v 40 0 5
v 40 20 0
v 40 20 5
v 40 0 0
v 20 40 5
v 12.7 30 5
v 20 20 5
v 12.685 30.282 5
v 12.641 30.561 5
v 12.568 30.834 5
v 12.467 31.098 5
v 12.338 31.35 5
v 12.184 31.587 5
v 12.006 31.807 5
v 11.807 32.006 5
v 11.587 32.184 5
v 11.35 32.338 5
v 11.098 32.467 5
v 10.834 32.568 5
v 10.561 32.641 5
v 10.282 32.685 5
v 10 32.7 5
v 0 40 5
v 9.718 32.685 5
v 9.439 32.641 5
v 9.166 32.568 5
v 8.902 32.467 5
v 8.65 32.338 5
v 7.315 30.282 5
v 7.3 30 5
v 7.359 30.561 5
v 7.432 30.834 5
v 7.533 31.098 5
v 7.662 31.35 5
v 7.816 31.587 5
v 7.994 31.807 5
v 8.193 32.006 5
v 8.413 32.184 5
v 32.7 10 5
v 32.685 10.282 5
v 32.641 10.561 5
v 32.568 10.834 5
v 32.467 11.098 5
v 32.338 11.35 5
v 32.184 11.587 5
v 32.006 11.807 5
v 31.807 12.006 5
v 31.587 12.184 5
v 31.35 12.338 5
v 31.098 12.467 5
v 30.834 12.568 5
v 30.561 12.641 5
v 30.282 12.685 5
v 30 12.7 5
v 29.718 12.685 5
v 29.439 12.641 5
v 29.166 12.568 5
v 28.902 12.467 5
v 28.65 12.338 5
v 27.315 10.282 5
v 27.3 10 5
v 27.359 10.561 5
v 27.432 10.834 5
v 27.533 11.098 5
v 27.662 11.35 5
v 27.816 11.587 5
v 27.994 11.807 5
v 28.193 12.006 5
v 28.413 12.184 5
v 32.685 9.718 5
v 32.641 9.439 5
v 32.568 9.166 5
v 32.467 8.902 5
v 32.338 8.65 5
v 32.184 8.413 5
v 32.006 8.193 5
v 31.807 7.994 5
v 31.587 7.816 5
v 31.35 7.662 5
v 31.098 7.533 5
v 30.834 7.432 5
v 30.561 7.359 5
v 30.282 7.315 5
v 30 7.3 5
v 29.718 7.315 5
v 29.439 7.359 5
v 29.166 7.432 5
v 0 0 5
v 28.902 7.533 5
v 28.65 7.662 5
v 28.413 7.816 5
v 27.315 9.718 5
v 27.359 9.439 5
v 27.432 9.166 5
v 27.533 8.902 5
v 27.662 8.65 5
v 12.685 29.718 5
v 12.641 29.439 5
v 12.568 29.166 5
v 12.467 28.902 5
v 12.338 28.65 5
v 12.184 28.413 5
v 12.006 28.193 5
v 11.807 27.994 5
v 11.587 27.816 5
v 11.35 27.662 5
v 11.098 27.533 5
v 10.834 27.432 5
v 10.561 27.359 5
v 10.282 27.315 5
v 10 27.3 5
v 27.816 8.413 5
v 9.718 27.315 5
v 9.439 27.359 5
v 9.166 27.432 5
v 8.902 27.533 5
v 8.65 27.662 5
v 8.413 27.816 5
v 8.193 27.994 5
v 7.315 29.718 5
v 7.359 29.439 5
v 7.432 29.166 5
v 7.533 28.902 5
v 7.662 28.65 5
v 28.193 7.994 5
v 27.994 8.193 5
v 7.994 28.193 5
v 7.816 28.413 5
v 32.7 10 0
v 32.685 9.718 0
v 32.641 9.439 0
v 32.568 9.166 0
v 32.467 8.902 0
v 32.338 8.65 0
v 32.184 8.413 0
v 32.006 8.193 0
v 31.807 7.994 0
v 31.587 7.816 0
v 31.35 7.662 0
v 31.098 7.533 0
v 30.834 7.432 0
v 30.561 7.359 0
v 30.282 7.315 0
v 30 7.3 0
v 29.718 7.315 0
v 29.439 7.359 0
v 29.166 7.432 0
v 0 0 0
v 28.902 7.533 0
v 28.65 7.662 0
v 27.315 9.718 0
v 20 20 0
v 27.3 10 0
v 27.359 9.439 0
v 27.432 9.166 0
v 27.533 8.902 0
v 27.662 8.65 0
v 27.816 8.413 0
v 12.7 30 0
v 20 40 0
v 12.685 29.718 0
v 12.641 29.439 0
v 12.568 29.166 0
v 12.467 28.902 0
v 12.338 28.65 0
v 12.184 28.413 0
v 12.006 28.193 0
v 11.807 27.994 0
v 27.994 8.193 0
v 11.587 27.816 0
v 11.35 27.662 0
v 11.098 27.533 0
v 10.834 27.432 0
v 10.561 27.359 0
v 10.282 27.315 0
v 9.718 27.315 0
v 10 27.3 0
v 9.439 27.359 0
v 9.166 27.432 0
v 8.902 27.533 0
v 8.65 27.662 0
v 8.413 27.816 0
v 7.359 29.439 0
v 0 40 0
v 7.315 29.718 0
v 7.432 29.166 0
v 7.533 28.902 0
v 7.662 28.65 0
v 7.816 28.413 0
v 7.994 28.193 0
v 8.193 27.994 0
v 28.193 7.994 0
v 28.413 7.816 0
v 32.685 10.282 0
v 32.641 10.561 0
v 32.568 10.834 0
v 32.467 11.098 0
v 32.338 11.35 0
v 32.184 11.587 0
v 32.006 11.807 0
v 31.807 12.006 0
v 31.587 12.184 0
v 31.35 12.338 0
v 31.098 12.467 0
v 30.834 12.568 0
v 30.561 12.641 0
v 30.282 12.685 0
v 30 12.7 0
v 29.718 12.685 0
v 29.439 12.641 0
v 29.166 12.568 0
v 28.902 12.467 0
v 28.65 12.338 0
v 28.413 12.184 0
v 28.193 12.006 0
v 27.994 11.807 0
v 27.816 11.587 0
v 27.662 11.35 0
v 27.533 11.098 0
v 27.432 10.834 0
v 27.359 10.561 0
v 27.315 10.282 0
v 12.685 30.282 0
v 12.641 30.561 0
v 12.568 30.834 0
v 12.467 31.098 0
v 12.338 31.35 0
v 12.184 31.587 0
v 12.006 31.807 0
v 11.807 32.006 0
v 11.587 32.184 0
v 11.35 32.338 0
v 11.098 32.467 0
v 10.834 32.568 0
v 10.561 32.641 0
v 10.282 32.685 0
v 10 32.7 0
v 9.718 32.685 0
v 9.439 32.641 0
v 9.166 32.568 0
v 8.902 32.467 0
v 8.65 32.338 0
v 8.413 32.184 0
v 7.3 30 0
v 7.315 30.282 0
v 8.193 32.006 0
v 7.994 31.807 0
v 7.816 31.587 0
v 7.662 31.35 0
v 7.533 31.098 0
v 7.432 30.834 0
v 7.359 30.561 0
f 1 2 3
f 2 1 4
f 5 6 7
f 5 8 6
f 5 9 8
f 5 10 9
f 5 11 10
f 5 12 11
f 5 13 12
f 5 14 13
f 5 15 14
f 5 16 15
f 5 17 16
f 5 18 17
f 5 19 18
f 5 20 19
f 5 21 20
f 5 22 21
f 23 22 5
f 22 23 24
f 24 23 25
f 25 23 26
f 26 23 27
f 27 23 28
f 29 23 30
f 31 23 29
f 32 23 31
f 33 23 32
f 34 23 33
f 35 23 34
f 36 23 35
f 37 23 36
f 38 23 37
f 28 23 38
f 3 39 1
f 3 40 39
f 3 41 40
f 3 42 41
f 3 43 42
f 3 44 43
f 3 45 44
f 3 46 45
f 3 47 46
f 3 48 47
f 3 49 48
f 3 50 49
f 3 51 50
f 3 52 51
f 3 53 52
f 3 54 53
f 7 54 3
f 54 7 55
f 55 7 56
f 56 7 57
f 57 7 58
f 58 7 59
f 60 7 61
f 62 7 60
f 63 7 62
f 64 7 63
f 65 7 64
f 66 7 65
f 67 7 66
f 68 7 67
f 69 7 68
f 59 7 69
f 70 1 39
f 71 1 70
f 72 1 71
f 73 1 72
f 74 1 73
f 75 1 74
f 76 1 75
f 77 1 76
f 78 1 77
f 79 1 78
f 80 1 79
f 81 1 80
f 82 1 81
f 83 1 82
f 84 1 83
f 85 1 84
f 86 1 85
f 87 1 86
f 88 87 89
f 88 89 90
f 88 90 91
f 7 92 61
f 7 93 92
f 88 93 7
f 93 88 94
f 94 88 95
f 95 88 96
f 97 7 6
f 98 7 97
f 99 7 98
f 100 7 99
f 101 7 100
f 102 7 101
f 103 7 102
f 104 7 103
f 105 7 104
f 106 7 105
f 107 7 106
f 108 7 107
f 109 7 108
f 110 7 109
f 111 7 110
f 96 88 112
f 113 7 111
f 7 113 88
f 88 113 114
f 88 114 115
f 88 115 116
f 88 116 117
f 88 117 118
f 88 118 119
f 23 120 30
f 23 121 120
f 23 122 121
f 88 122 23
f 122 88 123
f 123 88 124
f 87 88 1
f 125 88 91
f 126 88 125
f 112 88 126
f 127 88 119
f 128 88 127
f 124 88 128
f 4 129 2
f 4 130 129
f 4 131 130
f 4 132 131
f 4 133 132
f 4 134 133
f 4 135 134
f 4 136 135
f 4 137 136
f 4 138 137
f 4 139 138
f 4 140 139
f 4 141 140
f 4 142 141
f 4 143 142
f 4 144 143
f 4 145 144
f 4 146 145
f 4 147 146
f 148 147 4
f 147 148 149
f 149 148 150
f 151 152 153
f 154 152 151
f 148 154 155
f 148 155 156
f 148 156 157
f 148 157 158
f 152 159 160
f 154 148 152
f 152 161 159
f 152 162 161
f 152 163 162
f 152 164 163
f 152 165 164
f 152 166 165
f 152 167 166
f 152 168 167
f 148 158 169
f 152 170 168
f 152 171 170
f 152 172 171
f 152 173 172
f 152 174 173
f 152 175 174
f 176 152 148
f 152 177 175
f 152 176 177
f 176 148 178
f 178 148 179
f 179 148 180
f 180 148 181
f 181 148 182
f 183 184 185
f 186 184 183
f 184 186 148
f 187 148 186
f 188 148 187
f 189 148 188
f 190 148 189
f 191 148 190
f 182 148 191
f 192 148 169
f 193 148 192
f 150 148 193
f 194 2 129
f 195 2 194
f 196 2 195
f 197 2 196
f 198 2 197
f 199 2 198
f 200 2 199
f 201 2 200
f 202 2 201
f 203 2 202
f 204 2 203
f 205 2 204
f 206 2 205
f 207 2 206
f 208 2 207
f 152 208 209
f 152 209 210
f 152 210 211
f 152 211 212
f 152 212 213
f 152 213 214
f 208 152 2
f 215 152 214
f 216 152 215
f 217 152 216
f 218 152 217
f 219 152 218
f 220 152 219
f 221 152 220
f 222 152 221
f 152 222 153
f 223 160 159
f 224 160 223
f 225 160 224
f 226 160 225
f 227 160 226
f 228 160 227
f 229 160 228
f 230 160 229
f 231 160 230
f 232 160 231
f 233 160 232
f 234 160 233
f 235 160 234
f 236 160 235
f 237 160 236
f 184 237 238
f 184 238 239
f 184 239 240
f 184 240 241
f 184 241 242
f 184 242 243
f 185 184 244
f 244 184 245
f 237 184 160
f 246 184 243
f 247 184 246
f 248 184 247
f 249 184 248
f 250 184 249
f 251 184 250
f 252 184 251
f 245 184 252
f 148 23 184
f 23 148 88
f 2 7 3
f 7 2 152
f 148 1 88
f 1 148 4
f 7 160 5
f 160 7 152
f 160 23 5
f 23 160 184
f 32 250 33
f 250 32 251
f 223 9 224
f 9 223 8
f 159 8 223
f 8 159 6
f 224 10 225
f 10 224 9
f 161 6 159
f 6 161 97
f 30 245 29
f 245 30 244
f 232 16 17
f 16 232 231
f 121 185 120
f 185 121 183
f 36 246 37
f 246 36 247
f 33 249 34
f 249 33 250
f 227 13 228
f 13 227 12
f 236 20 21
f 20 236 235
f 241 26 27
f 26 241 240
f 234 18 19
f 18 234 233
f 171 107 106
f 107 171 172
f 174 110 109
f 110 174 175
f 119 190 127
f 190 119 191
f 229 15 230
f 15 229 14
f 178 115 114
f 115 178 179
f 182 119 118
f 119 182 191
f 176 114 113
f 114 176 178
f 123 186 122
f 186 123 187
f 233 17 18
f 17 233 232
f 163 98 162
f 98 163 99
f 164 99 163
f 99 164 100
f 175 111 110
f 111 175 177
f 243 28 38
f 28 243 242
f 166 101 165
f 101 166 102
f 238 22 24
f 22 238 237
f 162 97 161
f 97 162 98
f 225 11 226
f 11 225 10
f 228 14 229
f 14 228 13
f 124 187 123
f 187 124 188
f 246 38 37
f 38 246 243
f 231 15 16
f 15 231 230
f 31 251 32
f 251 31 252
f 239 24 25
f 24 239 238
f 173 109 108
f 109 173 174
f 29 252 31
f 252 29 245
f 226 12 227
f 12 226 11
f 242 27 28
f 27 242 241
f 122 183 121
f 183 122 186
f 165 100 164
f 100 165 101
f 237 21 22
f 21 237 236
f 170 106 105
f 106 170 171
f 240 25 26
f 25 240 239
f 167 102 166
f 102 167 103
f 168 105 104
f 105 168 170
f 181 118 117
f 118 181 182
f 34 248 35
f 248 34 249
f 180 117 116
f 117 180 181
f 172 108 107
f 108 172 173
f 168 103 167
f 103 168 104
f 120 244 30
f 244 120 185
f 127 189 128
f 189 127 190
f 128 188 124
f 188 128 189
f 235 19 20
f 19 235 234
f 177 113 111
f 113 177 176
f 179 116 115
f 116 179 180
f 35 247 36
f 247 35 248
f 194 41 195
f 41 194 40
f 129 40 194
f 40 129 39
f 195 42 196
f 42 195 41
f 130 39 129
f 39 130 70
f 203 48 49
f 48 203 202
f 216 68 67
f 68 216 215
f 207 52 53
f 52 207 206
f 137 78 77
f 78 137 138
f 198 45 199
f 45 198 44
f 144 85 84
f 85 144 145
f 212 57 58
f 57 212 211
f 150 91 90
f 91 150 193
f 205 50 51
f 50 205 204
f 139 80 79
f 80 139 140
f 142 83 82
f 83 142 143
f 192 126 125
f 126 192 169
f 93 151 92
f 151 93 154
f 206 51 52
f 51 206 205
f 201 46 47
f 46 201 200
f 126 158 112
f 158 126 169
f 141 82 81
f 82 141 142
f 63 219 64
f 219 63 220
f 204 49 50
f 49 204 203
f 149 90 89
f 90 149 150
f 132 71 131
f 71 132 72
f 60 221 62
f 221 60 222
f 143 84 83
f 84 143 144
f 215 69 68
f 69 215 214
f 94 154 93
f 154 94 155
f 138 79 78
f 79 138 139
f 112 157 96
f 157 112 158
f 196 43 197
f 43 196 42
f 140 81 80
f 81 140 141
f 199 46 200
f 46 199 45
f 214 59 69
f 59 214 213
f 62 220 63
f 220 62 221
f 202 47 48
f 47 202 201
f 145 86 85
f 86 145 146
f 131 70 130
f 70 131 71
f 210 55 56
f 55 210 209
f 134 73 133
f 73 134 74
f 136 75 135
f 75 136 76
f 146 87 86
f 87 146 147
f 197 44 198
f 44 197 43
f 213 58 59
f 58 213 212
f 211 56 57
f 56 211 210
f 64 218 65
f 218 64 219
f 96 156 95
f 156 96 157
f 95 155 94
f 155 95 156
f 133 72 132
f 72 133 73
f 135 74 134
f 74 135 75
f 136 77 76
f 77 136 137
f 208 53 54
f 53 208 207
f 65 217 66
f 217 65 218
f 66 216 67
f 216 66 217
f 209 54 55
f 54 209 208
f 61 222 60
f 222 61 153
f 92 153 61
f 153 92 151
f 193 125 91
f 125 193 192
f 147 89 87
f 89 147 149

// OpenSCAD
// Flat 90-degree corner plate.
$fn = 60;
eps = 0.02;
arm = 40;
width = 20;
plate_t = 5;
difference() {
    union() { cube([arm, width, plate_t]); cube([width, arm, plate_t]); }
    for (p = [[width / 2, arm - width / 2], [arm - width / 2, width / 2]])
        translate([p[0], p[1], -eps]) cylinder(d = 5.4, h = plate_t + 2 * eps);
}
